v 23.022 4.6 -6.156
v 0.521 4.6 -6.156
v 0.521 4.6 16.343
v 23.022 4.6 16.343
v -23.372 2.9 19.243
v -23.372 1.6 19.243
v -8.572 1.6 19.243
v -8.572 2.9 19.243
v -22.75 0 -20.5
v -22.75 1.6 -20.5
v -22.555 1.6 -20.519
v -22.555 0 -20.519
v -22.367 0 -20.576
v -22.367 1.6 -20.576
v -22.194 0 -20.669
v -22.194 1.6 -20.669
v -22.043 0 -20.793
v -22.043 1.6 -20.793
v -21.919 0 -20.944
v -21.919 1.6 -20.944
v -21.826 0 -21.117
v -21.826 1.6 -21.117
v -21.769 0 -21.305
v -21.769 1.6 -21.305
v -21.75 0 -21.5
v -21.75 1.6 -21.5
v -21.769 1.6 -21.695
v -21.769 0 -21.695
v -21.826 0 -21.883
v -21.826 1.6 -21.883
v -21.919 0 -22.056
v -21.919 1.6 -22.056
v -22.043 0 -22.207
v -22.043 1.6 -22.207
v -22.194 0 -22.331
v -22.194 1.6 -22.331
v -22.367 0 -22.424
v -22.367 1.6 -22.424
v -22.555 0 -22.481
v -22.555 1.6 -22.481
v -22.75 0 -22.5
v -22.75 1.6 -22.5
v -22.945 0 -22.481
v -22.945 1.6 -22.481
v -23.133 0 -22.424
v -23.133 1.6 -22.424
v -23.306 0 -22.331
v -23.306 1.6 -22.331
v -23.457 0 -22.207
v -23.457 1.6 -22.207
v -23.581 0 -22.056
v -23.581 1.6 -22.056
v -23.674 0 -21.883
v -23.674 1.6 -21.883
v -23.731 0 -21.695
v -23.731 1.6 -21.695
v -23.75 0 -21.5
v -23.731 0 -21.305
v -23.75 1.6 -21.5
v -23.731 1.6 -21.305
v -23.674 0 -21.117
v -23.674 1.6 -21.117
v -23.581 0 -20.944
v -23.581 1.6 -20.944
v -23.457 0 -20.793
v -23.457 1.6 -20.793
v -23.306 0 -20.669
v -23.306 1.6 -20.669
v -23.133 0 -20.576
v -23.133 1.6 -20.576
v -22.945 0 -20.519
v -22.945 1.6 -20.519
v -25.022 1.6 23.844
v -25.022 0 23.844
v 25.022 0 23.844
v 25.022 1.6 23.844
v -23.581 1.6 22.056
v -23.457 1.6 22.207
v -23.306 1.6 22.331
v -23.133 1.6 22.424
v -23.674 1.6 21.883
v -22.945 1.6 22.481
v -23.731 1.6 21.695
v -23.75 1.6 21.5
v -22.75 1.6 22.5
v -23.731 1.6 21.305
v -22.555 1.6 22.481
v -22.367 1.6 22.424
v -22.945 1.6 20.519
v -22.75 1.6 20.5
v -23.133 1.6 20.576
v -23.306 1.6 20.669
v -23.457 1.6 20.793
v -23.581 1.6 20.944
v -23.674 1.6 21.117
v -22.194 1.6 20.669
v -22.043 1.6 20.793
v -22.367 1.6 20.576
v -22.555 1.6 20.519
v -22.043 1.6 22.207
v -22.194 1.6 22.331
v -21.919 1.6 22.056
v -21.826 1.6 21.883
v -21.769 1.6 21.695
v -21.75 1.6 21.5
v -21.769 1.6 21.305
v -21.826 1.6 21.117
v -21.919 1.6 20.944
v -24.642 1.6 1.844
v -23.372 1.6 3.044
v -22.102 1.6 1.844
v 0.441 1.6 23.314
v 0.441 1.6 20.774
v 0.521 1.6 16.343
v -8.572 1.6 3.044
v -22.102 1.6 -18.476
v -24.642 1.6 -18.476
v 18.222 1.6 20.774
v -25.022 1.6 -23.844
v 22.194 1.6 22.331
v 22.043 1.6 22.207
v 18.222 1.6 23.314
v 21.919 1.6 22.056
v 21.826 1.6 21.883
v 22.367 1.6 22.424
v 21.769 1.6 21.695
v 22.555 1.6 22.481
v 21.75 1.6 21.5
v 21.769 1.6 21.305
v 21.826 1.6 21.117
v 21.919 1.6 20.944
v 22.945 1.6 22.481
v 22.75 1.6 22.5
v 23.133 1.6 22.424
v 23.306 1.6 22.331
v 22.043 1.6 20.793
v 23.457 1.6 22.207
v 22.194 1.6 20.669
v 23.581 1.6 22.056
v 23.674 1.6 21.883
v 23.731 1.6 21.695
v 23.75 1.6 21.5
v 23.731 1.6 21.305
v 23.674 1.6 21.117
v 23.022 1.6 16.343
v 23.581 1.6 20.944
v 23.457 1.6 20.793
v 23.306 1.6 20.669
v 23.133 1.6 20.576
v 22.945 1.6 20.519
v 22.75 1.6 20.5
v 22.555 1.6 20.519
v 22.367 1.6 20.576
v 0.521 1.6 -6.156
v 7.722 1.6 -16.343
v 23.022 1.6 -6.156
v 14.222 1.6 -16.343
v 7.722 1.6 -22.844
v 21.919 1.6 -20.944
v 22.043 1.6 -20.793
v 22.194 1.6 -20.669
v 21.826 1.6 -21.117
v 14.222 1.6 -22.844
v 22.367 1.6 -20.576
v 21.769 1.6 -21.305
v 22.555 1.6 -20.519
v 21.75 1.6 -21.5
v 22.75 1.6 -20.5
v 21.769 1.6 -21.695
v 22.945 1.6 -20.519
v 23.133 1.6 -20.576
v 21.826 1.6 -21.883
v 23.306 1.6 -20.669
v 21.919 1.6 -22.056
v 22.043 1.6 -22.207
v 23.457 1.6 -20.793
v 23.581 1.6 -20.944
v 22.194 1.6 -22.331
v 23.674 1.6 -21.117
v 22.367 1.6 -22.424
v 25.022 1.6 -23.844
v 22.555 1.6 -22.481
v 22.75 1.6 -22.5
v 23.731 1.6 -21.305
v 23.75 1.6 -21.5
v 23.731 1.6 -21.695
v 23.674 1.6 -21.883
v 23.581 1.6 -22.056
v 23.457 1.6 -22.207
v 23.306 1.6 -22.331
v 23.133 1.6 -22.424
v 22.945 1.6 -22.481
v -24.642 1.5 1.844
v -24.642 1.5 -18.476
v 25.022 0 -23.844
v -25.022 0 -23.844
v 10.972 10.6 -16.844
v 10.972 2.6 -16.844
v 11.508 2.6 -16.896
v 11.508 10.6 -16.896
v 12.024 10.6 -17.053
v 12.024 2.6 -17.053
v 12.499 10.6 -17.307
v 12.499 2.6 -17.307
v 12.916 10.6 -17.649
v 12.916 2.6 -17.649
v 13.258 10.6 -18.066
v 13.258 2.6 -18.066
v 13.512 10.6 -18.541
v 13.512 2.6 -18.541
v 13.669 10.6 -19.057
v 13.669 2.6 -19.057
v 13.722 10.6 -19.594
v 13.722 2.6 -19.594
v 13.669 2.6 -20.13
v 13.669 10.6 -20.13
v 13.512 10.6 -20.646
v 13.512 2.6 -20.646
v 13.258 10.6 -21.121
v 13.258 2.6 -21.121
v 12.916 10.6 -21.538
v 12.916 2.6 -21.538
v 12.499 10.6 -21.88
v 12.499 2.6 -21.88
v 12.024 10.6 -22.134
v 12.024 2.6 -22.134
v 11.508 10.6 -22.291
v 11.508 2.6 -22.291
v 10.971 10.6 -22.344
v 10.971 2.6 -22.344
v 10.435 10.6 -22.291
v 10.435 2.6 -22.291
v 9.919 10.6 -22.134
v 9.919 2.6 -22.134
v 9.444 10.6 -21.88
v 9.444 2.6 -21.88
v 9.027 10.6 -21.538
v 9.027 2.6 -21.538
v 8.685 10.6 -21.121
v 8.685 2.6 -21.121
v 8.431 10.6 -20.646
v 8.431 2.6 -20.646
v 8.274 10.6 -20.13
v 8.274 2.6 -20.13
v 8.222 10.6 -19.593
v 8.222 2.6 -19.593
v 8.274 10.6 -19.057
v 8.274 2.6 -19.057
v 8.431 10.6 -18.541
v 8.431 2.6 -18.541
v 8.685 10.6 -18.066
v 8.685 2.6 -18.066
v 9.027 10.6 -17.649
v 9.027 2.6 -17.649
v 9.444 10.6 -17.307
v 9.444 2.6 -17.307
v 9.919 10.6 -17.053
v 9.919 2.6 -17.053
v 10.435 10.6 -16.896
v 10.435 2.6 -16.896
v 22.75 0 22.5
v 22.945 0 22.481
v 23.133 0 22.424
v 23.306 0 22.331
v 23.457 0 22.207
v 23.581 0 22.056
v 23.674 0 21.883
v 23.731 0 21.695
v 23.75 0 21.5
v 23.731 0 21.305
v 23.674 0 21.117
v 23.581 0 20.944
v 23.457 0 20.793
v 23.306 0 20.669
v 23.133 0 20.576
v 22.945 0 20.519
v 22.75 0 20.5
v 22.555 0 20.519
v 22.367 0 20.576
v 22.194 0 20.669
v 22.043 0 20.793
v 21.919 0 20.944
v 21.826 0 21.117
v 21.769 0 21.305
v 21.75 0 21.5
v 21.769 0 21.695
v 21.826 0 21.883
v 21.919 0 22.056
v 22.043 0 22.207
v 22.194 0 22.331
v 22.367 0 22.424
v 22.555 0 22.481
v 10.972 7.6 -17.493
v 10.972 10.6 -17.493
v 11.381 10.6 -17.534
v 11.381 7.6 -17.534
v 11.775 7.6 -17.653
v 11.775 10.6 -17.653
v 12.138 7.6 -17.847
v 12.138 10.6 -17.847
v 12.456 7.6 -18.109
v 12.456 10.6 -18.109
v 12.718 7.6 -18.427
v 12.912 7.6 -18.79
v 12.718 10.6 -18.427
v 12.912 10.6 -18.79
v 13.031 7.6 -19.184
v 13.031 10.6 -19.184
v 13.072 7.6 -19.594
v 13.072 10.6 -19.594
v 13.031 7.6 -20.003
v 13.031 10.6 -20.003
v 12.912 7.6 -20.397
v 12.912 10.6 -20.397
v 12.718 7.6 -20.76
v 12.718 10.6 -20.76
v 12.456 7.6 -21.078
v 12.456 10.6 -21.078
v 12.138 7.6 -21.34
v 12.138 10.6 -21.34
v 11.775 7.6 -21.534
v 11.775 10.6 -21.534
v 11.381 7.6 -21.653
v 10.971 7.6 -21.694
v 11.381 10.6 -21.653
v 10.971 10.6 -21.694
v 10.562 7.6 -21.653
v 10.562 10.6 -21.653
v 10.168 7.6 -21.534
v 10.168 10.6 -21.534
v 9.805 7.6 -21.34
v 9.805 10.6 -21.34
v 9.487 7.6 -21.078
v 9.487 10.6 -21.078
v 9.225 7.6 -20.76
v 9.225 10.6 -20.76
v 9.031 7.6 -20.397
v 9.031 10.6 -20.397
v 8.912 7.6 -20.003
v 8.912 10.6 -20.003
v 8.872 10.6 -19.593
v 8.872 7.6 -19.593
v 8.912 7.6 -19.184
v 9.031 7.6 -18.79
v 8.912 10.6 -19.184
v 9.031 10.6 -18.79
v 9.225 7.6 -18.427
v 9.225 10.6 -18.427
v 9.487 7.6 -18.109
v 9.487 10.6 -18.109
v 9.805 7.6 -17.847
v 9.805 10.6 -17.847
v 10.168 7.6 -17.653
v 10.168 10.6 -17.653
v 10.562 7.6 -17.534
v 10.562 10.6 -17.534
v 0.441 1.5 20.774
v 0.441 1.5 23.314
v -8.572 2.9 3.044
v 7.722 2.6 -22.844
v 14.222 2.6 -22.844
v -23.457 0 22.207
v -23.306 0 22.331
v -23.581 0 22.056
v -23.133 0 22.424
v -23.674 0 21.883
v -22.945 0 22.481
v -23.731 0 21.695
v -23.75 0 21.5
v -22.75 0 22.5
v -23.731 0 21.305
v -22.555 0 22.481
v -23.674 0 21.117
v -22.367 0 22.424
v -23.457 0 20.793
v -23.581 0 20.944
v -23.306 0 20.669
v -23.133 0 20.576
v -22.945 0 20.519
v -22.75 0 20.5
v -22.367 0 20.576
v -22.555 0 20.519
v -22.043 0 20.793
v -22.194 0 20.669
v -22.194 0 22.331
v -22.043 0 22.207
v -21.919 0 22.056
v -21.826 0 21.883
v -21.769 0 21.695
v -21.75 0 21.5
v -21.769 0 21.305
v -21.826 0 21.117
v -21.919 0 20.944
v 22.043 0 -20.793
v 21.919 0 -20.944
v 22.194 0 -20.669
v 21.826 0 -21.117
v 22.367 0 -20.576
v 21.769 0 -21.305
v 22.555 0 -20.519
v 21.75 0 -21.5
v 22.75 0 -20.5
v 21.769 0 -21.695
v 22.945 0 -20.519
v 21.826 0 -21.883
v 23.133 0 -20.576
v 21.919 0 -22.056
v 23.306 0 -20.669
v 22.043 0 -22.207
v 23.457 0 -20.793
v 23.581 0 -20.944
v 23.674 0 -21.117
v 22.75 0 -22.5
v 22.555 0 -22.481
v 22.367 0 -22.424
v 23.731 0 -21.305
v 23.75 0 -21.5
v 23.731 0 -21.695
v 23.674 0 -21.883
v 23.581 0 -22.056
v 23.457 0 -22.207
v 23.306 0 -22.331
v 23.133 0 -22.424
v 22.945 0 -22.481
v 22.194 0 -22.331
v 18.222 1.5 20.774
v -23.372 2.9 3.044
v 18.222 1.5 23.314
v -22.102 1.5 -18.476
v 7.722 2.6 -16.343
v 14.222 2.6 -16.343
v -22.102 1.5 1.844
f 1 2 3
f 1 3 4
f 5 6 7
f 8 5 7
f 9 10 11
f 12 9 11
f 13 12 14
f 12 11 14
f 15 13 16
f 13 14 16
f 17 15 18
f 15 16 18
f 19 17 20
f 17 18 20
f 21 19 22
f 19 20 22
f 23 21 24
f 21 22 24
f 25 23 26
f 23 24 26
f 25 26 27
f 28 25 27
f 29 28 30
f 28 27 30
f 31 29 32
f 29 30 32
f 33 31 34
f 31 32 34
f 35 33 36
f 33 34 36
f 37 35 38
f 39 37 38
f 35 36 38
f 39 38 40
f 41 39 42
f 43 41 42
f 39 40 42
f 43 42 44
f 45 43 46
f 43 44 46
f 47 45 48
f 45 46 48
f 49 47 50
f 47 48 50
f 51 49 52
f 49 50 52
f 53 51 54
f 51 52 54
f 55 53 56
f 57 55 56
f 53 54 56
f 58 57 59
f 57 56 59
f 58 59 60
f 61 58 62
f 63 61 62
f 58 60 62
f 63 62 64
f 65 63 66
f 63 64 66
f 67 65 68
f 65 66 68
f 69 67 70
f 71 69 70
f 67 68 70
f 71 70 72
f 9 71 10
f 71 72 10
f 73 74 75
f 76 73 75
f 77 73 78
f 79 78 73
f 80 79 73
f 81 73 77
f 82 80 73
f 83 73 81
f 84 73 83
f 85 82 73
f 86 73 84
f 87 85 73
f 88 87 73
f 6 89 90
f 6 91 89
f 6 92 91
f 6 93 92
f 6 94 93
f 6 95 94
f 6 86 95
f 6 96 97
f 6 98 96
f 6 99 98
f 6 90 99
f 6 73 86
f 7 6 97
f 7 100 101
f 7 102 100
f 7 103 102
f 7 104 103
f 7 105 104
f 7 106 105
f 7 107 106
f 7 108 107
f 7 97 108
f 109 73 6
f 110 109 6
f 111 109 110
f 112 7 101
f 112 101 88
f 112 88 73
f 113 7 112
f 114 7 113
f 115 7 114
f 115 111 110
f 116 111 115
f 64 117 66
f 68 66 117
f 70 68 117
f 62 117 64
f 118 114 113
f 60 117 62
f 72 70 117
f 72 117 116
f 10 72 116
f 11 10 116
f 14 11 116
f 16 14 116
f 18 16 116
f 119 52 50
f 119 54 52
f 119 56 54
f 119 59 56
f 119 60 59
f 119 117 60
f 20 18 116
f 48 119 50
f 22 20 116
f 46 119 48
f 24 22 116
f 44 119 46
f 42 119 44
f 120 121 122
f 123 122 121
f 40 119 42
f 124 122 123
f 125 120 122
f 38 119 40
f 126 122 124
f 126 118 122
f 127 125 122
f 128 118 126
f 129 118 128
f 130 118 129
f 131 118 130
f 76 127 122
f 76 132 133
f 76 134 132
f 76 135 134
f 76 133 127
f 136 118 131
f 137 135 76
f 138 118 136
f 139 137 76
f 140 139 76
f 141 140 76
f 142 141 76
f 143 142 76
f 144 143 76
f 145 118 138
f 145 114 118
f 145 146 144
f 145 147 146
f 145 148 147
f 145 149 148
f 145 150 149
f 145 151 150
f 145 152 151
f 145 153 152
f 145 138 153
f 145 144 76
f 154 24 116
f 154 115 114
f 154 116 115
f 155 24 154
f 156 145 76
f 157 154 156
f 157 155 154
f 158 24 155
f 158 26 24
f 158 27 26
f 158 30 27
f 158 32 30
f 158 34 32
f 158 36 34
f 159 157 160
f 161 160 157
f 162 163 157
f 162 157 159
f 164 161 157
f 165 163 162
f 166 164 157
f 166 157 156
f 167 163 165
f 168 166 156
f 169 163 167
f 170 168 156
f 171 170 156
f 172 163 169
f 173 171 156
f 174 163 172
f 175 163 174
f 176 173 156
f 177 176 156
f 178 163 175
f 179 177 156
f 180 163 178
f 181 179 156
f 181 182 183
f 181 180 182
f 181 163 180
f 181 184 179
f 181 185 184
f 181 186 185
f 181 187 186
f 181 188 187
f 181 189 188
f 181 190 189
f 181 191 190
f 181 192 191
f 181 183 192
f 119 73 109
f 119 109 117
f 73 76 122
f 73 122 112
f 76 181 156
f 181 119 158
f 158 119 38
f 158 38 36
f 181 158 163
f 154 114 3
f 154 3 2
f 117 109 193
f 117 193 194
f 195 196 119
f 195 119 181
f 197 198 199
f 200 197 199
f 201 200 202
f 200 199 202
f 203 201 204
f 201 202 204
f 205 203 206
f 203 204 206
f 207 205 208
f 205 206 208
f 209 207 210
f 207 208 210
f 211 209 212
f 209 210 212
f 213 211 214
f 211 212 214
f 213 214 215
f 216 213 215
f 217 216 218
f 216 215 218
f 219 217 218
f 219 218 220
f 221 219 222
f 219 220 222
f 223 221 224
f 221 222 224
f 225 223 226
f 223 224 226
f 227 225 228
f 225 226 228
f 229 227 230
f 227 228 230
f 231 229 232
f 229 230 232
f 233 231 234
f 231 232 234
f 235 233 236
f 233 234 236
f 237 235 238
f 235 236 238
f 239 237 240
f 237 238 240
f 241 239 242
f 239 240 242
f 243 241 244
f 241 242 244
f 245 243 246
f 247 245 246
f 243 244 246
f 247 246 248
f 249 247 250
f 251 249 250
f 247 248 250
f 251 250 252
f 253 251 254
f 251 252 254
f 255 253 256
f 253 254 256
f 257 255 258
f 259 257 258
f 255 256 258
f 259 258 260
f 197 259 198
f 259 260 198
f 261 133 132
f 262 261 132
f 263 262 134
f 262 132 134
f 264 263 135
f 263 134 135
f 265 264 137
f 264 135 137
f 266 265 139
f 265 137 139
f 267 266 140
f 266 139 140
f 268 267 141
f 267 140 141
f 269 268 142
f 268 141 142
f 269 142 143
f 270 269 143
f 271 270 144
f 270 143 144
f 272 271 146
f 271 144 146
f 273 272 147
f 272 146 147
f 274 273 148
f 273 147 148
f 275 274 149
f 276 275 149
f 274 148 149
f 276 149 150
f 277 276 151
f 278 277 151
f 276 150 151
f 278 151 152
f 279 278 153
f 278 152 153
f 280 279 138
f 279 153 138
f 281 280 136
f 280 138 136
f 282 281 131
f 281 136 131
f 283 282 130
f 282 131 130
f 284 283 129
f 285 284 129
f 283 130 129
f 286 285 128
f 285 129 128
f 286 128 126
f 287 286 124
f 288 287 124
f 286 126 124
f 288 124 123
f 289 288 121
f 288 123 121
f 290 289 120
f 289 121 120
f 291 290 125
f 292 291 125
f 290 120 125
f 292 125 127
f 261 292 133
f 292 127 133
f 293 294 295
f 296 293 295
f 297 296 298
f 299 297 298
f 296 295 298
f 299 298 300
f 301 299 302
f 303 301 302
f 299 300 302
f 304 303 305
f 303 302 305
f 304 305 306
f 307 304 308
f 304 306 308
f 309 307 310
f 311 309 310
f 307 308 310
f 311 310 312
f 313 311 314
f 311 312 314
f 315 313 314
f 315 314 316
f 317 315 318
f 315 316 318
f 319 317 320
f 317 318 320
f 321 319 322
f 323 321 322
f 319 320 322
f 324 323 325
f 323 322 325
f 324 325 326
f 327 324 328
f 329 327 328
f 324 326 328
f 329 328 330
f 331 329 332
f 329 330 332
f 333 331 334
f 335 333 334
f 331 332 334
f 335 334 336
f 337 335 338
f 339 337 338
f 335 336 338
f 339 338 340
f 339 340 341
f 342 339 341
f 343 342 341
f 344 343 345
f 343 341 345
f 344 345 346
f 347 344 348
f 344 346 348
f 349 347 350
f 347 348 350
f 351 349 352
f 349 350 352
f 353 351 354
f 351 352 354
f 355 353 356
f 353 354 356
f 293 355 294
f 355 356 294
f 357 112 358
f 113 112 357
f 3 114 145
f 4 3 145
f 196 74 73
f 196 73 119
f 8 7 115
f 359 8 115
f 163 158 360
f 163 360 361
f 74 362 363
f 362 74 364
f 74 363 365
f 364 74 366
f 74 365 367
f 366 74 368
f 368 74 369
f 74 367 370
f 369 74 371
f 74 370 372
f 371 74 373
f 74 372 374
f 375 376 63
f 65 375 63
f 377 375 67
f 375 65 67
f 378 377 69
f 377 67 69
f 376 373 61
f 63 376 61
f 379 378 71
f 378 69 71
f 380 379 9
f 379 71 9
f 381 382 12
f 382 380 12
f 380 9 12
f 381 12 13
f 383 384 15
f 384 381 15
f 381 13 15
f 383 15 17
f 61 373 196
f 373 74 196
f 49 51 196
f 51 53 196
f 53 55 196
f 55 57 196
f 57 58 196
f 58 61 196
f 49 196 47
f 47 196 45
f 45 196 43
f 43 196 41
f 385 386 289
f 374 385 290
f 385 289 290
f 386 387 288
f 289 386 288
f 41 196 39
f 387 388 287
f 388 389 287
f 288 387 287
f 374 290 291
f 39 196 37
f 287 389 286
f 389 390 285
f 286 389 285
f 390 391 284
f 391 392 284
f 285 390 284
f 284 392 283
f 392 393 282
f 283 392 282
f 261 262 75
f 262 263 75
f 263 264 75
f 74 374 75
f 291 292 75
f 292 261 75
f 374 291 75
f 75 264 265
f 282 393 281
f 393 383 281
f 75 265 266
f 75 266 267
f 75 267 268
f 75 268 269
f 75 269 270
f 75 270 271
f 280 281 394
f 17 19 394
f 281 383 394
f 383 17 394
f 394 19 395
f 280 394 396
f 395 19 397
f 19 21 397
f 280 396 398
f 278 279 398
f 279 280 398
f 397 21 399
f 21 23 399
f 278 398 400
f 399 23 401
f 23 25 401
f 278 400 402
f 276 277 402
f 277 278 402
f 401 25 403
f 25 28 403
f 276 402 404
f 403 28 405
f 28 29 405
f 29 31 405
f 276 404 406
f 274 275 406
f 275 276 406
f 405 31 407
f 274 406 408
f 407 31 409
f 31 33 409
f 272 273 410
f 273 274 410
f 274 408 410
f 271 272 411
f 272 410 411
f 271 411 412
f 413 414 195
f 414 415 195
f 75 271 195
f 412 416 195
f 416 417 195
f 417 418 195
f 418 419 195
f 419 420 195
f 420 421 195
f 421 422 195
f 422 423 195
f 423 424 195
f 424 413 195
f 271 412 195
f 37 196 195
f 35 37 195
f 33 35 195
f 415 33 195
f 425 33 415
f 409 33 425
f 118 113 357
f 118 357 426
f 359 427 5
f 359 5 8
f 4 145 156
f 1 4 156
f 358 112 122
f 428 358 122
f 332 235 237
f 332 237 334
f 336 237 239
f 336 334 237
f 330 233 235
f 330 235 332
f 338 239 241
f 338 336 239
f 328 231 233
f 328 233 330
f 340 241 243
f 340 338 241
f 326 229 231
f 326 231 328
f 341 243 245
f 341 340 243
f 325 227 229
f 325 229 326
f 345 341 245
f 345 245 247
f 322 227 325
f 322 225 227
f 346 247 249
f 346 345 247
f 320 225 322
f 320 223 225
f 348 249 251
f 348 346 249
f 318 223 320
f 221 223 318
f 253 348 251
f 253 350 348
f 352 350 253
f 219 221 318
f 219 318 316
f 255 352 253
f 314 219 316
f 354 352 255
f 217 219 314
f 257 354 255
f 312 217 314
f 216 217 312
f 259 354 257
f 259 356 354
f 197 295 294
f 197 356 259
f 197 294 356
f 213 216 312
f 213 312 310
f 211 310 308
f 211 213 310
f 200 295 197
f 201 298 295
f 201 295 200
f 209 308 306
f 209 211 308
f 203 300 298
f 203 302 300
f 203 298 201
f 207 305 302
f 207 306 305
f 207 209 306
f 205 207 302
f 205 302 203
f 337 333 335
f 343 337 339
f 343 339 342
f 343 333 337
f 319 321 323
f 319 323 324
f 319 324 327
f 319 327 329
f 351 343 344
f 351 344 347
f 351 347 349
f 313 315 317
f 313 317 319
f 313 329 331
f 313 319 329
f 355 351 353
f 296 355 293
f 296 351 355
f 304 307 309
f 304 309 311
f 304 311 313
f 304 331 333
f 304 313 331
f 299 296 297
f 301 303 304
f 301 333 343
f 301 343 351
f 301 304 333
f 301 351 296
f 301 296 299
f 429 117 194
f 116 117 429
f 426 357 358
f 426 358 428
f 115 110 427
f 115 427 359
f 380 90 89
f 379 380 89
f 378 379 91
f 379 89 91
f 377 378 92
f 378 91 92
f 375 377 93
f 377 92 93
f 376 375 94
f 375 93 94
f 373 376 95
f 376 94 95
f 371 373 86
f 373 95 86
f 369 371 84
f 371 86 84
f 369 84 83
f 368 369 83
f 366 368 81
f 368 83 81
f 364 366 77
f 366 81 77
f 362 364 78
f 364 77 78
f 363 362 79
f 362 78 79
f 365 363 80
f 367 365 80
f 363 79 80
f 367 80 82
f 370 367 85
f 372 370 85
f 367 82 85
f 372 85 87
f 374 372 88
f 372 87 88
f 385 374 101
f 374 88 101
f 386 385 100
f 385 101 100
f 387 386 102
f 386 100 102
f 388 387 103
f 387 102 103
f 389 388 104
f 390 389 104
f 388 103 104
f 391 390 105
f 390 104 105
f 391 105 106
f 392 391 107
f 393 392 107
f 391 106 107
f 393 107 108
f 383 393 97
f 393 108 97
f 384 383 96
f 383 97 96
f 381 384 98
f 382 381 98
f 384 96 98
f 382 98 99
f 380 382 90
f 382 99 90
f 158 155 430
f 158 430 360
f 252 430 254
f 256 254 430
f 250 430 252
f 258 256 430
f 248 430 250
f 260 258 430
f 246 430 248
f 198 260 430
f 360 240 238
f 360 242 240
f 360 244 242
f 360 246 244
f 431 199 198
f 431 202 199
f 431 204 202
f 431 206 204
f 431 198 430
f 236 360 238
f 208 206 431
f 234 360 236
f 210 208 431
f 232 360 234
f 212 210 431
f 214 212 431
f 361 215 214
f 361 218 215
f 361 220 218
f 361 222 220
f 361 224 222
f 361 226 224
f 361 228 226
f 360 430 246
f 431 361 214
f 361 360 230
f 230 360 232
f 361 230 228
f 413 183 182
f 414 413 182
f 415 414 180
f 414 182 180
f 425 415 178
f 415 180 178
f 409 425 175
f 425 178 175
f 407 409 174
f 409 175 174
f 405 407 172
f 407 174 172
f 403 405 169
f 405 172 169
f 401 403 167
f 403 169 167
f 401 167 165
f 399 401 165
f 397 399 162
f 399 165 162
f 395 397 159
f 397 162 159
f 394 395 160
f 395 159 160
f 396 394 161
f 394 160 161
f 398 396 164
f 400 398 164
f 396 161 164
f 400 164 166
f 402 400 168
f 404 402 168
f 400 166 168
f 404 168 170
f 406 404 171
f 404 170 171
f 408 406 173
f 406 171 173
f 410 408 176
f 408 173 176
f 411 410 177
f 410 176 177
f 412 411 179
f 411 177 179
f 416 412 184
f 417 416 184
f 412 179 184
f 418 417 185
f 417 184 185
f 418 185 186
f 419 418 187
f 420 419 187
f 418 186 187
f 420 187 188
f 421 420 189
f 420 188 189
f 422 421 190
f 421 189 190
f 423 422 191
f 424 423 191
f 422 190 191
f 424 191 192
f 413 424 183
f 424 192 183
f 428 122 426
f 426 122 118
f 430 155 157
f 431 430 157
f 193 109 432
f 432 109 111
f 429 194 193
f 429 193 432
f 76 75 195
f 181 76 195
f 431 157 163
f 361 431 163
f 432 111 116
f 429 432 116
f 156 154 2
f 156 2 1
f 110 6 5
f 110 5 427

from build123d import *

# Parameters (mm, degrees)
SKETCH_2_W          = 50.043
SKETCH_2_H          = 47.687
EXTRUDE_1_DEPTH     = 1.6
SKETCH_3_R          = 1
CUT_EXTRUDE_1_DEPTH = 1.6
SKETCH_4_W          = 22.5
SKETCH_4_H          = 22.5
EXTRUDE_2_DEPTH     = 3
SKETCH_5_W          = 14.8
SKETCH_5_H          = 16.2
EXTRUDE_3_DEPTH     = 1.3
SKETCH_6_W          = 2.54
SKETCH_6_H          = 20.32
SKETCH_6_W_2        = 17.78
SKETCH_6_H_2        = 2.54
CUT_EXTRUDE_2_DEPTH = 0.1
SKETCH_7_W          = 6.5
SKETCH_7_H          = 6.5
EXTRUDE_4_DEPTH     = 1
SKETCH_8_R          = 2.75
EXTRUDE_5_DEPTH     = 8
SKETCH_9_R          = 2.1
CUT_EXTRUDE_3_DEPTH = 3


with BuildPart() as part:
    # 草图2 → 凸台-拉伸1 (new body)
    with BuildSketch(Plane(origin=(0, 0, 0), x_dir=(1, 0, 0), z_dir=(0, 1, 0))):
        Rectangle(SKETCH_2_W, SKETCH_2_H)
    extrude(amount=EXTRUDE_1_DEPTH)

    # 草图3 → 切除-拉伸1 (cut)
    with BuildSketch(Plane(origin=(0, 1.6, 0), x_dir=(1, 0, 0), z_dir=(0, 1, 0))):
        with Locations(Location((-22.75, 21.5, 0), (0, 0, 270))):
            Circle(SKETCH_3_R)
        with Locations(Location((22.75, 21.5, 0), (0, 0, 90))):
            Circle(SKETCH_3_R)
        with Locations(Location((22.75, -21.5, 0), (0, 0, 270))):
            Circle(SKETCH_3_R)
        with Locations(Location((-22.75, -21.5, 0), (0, 0, 90))):
            Circle(SKETCH_3_R)
    extrude(amount=-CUT_EXTRUDE_1_DEPTH, mode=Mode.SUBTRACT)

    # 草图4 → 凸台-拉伸2 (add)
    with BuildSketch(Plane(origin=(0, 1.6, 0), x_dir=(1, 0, 0), z_dir=(0, 1, 0))):
        with Locations((11.7715, -5.0935)):
            Rectangle(SKETCH_4_W, SKETCH_4_H)
    extrude(amount=EXTRUDE_2_DEPTH)

    # 草图5 → 凸台-拉伸3 (add)
    with BuildSketch(Plane(origin=(0, 1.6, 0), x_dir=(1, 0, 0), z_dir=(0, 1, 0))):
        with Locations((-15.9715, -11.1435)):
            Rectangle(SKETCH_5_W, SKETCH_5_H)
    extrude(amount=EXTRUDE_3_DEPTH)

    # 草图6 → 切除-拉伸2 (cut)
    with BuildSketch(Plane(origin=(0, 1.6, 0), x_dir=(1, 0, 0), z_dir=(0, 1, 0))):
        with Locations((-23.3715, 8.3165)):
            Rectangle(SKETCH_6_W, SKETCH_6_H)
        with Locations((9.3315, -22.0435)):
            Rectangle(SKETCH_6_W_2, SKETCH_6_H_2)
    extrude(amount=-CUT_EXTRUDE_2_DEPTH, mode=Mode.SUBTRACT)

    # 草图7 → 凸台-拉伸4 (add)
    with BuildSketch(Plane(origin=(0, 1.6, 0), x_dir=(1, 0, 0), z_dir=(0, 1, 0))):
        with Locations((10.9715, 19.5935)):
            Rectangle(SKETCH_7_W, SKETCH_7_H)
    extrude(amount=EXTRUDE_4_DEPTH)

    # 草图8 → 凸台-拉伸5 (add)
    with BuildSketch(Plane(origin=(0, 2.6, 0), x_dir=(1, 0, 0), z_dir=(0, 1, 0))):
        with Locations(Location((10.9715, 19.5935, 0), (0, 0, 270))):
            Circle(SKETCH_8_R)
    extrude(amount=EXTRUDE_5_DEPTH)

    # 草图9 → 切除-拉伸3 (cut)
    with BuildSketch(Plane(origin=(0, 10.6, 0), x_dir=(1, 0, 0), z_dir=(0, 1, 0))):
        with Locations(Location((10.9715, 19.5935, 0), (0, 0, 270))):
            Circle(SKETCH_9_R)
    extrude(amount=-CUT_EXTRUDE_3_DEPTH, mode=Mode.SUBTRACT)


solid = part.part
